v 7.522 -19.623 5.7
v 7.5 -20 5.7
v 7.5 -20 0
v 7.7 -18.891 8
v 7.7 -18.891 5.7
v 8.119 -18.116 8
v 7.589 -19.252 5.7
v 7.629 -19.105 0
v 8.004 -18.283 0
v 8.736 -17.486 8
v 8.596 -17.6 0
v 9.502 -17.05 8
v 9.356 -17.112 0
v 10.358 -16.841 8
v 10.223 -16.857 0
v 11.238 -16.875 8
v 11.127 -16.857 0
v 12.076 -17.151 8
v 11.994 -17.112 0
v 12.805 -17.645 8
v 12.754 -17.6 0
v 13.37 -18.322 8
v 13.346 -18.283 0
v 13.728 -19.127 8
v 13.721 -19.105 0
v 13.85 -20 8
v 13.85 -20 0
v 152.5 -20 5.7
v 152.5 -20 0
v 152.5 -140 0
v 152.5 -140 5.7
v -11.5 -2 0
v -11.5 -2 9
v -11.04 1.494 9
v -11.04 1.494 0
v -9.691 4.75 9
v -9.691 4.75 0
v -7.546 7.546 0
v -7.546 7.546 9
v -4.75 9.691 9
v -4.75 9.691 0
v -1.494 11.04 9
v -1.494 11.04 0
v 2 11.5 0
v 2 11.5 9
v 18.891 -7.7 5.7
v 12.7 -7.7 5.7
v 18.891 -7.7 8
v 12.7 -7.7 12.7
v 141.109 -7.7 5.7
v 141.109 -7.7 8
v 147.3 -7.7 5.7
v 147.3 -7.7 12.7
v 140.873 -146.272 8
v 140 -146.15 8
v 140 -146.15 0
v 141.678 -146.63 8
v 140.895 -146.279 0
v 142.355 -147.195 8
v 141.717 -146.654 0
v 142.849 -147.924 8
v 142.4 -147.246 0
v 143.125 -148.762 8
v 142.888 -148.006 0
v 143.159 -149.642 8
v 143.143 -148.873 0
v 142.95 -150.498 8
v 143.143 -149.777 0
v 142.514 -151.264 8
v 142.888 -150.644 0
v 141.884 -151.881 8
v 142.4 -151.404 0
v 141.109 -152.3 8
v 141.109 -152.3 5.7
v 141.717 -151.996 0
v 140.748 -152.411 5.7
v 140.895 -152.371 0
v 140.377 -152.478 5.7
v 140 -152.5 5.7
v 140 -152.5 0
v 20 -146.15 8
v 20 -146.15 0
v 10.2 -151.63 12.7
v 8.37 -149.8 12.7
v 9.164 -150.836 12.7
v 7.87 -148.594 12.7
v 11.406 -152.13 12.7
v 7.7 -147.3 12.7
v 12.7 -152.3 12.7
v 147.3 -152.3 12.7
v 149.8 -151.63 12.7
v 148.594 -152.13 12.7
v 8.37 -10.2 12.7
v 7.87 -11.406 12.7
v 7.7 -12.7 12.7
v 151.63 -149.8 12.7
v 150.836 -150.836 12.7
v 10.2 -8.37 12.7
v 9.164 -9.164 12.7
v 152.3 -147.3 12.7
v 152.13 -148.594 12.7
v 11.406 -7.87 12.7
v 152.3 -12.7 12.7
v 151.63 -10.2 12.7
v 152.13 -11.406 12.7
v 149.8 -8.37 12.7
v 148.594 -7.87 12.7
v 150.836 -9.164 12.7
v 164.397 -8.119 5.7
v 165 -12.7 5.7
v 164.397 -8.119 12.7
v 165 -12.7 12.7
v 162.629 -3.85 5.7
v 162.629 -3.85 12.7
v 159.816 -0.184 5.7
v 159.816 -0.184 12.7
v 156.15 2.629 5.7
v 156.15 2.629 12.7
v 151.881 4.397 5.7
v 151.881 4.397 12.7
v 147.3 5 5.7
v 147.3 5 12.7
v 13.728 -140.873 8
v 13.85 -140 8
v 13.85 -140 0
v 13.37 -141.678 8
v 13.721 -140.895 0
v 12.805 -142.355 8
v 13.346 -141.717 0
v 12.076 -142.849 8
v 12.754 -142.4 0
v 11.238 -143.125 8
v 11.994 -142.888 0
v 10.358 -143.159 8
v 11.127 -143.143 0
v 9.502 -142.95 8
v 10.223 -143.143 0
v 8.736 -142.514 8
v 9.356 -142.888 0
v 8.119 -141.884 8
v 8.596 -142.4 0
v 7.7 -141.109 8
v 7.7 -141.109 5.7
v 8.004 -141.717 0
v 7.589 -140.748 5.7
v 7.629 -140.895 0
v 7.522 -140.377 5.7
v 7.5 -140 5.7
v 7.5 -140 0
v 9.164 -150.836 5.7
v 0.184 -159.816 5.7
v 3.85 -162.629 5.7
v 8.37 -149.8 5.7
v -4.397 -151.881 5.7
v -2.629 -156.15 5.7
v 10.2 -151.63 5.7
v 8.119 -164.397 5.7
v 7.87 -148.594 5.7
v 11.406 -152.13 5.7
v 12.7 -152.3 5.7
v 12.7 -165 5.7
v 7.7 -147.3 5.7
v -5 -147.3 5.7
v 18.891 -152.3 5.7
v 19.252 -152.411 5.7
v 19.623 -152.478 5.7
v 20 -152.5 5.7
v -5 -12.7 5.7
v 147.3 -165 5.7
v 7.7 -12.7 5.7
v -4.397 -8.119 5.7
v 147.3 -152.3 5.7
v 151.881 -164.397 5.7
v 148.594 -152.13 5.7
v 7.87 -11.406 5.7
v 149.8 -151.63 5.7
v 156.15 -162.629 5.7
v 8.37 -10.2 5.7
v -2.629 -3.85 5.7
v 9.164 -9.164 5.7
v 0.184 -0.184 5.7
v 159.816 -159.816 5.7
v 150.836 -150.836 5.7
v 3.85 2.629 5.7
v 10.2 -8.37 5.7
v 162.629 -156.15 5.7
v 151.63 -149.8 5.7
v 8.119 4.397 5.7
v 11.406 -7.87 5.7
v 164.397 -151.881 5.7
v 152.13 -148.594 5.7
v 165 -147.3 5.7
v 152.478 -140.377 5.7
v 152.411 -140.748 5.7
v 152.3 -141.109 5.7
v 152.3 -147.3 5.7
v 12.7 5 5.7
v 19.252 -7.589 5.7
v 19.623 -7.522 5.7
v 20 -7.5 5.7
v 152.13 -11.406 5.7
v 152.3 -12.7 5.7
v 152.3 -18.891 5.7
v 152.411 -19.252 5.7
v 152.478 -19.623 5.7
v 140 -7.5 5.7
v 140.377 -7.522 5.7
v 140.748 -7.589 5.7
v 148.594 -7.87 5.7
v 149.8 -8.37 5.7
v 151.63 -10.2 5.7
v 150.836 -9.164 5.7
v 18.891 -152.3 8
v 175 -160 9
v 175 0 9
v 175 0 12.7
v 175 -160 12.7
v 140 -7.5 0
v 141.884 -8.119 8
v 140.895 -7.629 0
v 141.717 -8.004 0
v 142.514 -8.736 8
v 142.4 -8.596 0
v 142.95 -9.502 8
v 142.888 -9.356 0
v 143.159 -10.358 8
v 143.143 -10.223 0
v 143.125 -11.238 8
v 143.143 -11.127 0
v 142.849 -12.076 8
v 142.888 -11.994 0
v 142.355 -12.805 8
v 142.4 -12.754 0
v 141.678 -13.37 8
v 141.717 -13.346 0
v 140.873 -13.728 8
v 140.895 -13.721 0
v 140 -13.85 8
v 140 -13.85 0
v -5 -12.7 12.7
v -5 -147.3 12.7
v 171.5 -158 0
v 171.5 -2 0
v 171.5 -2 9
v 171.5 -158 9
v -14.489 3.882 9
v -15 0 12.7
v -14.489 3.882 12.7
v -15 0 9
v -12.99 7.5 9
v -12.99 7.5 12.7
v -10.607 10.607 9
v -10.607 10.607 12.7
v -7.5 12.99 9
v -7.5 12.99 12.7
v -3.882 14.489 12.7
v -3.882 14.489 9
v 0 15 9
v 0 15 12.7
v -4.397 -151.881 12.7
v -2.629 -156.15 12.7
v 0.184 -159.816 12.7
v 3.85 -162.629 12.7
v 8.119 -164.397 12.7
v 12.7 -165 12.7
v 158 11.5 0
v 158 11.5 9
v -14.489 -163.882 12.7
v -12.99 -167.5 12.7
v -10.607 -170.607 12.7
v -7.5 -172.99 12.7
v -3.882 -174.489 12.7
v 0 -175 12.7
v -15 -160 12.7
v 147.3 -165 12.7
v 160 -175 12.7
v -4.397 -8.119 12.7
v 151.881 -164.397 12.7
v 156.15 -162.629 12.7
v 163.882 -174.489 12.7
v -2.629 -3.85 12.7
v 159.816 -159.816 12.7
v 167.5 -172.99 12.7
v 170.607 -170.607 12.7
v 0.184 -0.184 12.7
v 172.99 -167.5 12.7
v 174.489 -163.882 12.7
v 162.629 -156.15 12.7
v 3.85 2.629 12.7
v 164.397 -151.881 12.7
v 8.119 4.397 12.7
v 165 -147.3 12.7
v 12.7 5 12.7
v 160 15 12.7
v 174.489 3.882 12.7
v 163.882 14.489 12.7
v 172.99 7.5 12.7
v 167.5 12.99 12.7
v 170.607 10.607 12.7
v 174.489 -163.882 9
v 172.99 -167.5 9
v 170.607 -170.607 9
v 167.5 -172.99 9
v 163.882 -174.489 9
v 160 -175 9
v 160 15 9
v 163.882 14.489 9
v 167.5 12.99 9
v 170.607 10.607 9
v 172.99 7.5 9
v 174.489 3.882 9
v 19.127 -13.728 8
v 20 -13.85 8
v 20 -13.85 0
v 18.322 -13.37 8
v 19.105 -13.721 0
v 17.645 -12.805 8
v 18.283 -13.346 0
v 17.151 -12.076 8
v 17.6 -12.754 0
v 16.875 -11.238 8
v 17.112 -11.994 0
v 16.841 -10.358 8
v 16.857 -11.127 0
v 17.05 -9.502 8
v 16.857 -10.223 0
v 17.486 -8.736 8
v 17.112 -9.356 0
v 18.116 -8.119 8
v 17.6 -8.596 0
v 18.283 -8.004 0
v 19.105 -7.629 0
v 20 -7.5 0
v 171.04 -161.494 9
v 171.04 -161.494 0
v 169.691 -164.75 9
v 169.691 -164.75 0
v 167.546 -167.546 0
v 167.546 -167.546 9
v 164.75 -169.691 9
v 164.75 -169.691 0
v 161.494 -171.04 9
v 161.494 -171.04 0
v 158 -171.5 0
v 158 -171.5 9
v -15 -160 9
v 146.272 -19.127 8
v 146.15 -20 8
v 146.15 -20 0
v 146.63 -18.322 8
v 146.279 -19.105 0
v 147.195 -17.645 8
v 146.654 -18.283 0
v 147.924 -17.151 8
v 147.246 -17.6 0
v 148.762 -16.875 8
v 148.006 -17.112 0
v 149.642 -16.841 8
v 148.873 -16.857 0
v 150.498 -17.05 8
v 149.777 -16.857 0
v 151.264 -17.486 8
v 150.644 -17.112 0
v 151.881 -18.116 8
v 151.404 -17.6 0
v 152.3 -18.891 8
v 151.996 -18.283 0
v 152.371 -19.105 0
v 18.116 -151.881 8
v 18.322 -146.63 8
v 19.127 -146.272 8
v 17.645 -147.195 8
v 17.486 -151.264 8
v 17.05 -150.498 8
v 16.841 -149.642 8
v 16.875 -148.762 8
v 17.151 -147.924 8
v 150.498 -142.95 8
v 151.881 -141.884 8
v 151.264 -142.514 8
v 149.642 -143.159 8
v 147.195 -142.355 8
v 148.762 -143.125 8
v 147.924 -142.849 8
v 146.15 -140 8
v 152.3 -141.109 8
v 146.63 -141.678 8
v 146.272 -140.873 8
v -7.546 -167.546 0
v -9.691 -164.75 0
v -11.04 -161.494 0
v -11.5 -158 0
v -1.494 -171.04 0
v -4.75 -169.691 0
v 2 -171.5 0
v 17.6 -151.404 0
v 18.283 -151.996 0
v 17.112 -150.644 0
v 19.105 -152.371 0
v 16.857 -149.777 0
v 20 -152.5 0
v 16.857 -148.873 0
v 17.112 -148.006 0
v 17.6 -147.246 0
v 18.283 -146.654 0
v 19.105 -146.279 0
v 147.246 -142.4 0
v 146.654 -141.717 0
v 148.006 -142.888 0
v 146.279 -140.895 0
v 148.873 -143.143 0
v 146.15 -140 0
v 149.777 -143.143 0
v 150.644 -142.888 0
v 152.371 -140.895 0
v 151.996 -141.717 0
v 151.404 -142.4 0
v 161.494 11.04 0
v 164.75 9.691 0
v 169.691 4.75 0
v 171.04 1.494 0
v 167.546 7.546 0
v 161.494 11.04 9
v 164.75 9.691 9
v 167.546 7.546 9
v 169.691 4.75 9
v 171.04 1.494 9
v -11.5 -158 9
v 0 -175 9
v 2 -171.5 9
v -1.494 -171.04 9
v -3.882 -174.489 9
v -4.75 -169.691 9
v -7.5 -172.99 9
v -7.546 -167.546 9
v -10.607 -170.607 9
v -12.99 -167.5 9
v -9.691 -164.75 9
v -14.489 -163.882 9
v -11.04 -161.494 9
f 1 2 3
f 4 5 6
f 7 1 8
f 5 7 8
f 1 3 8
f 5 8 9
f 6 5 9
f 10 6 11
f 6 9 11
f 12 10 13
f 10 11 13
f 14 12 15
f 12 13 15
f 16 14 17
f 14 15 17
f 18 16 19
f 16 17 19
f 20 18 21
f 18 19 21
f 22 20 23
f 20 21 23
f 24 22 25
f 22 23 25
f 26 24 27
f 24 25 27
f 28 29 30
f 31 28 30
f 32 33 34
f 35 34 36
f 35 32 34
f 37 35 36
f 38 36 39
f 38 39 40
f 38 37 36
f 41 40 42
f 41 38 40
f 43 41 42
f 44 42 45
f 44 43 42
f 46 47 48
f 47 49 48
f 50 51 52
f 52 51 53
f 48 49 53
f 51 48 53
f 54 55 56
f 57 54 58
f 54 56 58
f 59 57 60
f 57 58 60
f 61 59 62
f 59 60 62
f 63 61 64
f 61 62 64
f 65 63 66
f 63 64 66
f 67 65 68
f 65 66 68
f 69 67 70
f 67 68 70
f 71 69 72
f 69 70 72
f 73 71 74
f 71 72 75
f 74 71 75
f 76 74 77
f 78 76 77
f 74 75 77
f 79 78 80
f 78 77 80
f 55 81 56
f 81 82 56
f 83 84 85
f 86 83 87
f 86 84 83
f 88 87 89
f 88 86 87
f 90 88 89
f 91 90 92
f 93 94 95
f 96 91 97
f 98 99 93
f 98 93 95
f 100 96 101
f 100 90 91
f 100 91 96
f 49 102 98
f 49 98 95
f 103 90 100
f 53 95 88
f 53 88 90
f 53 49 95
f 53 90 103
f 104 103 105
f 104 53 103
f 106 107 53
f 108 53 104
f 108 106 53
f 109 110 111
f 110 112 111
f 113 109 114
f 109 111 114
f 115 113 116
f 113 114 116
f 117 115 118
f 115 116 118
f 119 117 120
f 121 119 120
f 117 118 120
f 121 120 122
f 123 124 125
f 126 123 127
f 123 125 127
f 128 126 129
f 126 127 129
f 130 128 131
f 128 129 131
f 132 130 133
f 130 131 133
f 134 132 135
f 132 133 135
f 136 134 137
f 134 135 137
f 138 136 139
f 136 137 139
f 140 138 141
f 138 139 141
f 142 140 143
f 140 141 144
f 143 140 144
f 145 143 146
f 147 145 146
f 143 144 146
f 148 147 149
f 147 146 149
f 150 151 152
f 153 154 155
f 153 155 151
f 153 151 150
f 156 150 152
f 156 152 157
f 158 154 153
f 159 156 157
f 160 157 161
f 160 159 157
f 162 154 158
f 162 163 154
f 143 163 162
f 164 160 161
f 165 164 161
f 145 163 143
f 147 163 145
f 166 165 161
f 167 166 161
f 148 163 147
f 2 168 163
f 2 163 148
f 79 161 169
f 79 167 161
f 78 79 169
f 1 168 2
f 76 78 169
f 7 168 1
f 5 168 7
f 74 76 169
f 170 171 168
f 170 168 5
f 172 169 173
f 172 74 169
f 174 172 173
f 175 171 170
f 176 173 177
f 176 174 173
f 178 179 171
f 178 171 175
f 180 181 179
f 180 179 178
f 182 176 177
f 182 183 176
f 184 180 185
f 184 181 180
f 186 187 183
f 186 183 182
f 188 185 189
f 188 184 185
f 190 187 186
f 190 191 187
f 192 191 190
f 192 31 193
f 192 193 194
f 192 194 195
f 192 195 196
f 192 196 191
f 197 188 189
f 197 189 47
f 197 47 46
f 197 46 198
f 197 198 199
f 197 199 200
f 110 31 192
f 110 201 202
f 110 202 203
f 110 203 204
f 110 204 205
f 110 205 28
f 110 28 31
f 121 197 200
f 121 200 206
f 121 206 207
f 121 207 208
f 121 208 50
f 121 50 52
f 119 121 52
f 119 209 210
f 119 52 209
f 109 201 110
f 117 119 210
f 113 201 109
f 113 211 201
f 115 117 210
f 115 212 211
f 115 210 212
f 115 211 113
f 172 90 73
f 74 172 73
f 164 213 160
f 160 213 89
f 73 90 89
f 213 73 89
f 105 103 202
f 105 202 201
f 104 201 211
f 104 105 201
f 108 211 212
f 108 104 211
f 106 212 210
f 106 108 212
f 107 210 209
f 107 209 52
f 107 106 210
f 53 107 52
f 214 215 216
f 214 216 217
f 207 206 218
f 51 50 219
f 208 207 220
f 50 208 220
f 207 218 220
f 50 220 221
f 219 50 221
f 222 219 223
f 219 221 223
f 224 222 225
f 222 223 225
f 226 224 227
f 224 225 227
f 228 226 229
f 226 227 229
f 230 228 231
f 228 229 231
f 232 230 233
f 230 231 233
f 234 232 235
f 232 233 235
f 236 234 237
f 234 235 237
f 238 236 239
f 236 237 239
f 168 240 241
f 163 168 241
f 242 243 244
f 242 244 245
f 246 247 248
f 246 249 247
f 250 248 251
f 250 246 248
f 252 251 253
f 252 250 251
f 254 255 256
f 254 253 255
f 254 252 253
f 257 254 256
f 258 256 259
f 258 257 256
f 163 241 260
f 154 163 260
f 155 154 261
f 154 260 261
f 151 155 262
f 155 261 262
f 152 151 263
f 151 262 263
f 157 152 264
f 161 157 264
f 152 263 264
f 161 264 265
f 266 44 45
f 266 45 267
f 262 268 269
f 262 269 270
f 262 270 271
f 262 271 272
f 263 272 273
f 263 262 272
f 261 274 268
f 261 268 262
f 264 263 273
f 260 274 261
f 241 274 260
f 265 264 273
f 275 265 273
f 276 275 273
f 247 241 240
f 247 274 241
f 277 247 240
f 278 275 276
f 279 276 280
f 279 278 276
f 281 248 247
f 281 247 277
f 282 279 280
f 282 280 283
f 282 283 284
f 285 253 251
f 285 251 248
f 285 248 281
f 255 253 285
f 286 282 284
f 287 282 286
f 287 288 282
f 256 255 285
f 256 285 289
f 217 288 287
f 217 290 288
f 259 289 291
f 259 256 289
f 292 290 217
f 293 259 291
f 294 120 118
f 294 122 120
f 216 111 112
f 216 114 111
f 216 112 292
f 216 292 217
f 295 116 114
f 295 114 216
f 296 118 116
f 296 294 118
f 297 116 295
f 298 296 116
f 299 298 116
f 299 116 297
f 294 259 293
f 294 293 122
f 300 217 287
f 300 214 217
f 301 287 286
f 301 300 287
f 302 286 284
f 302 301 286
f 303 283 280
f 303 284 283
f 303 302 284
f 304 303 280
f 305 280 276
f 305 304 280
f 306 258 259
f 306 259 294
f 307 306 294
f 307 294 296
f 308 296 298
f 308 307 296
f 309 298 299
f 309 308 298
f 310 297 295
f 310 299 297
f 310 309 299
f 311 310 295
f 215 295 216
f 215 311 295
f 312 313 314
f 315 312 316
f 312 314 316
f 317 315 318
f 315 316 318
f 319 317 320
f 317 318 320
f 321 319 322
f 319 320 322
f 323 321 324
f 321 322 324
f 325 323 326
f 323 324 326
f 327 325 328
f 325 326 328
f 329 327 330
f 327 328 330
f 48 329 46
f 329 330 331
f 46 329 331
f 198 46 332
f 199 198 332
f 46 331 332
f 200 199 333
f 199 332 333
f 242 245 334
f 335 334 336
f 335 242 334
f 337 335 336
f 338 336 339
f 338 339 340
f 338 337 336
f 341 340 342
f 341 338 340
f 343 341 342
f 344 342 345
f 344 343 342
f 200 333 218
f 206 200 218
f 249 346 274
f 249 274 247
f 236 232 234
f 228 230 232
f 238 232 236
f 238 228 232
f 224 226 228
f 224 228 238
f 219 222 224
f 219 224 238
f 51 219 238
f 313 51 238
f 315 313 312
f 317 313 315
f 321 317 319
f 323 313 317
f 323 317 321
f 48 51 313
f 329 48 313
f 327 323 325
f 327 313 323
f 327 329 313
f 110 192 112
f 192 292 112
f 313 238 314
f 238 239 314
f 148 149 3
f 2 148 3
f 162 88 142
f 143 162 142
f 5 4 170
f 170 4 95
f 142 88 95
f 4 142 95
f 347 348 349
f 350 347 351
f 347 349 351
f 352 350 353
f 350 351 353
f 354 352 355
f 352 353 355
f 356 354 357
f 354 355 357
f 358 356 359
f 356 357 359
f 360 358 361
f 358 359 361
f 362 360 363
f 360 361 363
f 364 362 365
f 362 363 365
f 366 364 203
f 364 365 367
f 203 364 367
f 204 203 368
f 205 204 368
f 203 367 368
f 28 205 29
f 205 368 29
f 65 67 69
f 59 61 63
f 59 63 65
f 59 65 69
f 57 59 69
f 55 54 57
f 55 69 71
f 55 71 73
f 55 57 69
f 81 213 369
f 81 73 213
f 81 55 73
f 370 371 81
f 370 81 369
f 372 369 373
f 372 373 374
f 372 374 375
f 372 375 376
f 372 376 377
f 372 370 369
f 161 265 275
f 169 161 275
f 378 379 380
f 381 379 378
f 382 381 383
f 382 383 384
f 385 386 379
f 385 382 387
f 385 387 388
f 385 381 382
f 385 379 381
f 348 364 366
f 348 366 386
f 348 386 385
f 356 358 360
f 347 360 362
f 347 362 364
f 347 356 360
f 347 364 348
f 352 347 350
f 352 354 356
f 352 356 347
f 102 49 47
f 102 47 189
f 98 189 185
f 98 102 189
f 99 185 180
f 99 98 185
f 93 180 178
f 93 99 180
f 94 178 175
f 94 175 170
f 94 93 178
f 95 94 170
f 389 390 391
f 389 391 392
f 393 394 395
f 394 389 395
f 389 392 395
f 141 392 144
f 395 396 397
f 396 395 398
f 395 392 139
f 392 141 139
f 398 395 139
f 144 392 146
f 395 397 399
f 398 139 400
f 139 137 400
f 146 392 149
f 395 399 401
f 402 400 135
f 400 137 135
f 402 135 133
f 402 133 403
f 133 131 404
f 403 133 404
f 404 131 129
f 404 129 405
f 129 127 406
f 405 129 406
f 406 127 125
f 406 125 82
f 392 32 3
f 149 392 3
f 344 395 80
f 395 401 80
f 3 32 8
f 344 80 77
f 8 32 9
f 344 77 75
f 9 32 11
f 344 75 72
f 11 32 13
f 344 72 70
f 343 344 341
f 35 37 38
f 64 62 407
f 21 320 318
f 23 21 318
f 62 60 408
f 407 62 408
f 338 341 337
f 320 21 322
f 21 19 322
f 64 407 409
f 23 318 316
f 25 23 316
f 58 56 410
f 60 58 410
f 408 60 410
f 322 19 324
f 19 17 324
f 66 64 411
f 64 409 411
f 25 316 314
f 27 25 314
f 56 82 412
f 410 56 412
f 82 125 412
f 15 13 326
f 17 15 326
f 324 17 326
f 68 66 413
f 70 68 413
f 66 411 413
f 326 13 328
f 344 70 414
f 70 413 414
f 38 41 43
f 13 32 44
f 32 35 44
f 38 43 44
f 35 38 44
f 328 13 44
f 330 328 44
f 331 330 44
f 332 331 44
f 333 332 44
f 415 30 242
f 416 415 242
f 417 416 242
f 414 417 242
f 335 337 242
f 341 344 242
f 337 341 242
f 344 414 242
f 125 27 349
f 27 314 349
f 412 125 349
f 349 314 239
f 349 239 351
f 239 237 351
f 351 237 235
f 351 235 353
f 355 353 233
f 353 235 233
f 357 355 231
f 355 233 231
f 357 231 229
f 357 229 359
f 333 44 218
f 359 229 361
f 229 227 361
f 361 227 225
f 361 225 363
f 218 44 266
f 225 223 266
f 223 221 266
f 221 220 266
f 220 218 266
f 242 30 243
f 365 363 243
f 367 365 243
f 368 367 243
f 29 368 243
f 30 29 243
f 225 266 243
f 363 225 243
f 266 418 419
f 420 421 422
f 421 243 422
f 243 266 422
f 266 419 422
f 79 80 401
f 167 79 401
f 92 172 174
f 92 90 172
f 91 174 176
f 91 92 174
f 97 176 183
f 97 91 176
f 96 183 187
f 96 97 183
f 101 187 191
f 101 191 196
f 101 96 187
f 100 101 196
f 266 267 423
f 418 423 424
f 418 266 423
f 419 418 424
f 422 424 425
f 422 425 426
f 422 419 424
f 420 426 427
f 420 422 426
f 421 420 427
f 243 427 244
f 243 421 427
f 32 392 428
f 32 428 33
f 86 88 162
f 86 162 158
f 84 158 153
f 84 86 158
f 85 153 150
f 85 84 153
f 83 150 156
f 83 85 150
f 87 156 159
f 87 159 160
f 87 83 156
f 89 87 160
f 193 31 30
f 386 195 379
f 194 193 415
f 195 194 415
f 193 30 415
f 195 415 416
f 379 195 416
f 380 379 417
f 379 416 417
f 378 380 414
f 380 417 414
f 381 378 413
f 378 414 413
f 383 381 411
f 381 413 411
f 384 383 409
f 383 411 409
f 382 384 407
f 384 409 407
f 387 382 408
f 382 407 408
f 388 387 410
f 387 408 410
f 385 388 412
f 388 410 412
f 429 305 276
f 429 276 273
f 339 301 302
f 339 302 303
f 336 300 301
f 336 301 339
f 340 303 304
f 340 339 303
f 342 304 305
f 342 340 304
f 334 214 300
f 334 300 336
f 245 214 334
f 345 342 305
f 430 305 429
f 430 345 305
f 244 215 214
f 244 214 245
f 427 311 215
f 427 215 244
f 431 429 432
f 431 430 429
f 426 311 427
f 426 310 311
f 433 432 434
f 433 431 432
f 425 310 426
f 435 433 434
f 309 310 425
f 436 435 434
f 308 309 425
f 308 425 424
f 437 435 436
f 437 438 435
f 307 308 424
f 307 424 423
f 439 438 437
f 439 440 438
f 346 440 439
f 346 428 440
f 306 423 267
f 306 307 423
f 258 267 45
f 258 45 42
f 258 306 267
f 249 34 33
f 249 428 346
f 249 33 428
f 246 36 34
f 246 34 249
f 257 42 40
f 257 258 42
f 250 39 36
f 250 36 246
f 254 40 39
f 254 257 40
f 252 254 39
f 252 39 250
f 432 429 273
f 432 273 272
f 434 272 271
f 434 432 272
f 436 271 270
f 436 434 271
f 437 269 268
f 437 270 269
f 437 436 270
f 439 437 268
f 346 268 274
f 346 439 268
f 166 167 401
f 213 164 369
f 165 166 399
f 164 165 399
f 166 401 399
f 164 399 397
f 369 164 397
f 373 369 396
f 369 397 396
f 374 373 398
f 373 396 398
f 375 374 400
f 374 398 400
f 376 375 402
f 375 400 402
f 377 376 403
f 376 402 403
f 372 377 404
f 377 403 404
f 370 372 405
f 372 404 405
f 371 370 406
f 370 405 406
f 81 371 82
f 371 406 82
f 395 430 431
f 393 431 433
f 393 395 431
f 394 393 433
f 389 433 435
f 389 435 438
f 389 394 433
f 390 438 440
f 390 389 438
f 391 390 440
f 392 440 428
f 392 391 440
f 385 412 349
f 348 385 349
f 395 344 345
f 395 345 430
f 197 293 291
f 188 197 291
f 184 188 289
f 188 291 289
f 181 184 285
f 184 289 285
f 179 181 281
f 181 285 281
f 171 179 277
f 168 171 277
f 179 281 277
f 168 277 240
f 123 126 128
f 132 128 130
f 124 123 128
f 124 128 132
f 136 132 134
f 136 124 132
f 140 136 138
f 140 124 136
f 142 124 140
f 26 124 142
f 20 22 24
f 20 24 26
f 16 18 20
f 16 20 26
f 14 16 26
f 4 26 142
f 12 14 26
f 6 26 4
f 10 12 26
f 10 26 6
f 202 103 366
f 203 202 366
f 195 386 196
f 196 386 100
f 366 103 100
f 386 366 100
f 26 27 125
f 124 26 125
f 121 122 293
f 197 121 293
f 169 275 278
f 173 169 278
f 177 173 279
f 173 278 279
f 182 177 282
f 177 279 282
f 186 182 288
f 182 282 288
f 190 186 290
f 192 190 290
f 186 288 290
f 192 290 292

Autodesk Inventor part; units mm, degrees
ref_plane "YZ Plane" through (0, 0, 0) normal (1, 0, 0) x (0, 1, 0)
ref_plane "XZ Plane" through (0, 0, 0) normal (0, 1, 0) x (-1, 0, 0)
ref_plane "XY Plane" through (0, 0, 0) normal (0, 0, 1) x (1, 0, 0)
sketch "Sketch1" plane through (0, 0, 0) normal (0, 0, 1) x (1, 0, 0)
  arc A0 (-15, -160) -> (0, -175) centre (0, -160) ccw
  line L0 (0, 15) -> (160, 15)
  line L1 (175, 0) -> (175, -160)
  line L2 (160, -175) -> (0, -175)
  line L3 (-15, -160) -> (-15, 0)
  arc A1 (0, 15) -> (-15, 0) centre (0, 0) ccw
  arc A2 (160, -175) -> (175, -160) centre (160, -160) ccw
  arc A3 (175, 0) -> (160, 15) centre (160, 0) ccw
  point P0 (-15, 15)
  dimension "d0" = 190
  dimension "d1" = 190
  dimension "d2" = 15
extrude "Extrusion1" add sketch "Sketch1" along normal blind 12.7
sketch "Sketch2" plane through (0, 0, 12.7) normal (0, 0, 1) x (1, 0, 0)
  line L0 (-15, 0) -> (-15, -160) projected
  arc A0 (-15, -160) -> (0, -175) centre (0, -160) ccw projected
  line L1 (0, -175) -> (160, -175) projected
  arc A1 (160, -175) -> (175, -160) centre (160, -160) ccw projected
  line L2 (175, -160) -> (175, 0) projected
  arc A2 (175, 0) -> (160, 15) centre (160, 0) ccw projected
  line L3 (160, 15) -> (0, 15) projected
  arc A3 (0, 15) -> (-15, 0) centre (0, 0) ccw projected
  line L4 (0, 0) -> (160, -160) construction
  line L5 (147.3, -152.3) -> (12.7, -152.3)
  line L6 (7.7, -147.3) -> (7.7, -12.7)
  line L7 (12.7, -7.7) -> (147.3, -7.7)
  line L8 (152.3, -12.7) -> (152.3, -147.3)
  line L9 (152.3, -152.3) -> (7.7, -7.7) construction
  line L10 (7.7, -152.3) -> (152.3, -7.7) construction
  arc A4 (12.7, -7.7) -> (7.7, -12.7) centre (12.7, -12.7) ccw
  arc A5 (152.3, -12.7) -> (147.3, -7.7) centre (147.3, -12.7) ccw
  arc A6 (147.3, -152.3) -> (152.3, -147.3) centre (147.3, -147.3) ccw
  arc A7 (7.7, -147.3) -> (12.7, -152.3) centre (12.7, -147.3) ccw
  line L11 (147.3, 5) -> (12.7, 5)
  arc A8 (12.7, 5) -> (-5, -12.7) centre (12.7, -12.7) ccw
  line L12 (-5, -12.7) -> (-5, -147.3)
  arc A9 (-5, -147.3) -> (12.7, -165) centre (12.7, -147.3) ccw
  line L13 (12.7, -165) -> (147.3, -165)
  arc A10 (147.3, -165) -> (165, -147.3) centre (147.3, -147.3) ccw
  line L14 (165, -147.3) -> (165, -12.7)
  arc A11 (165, -12.7) -> (147.3, 5) centre (147.3, -12.7) ccw
  point P0 (80, -80)
  dimension "d7" = 5
  dimension "d8" = 12.7
  dimension "d9" = 10
extrude "Extrusion2" cut sketch "Sketch2" against normal blind 7 contours A11 L14 A10 L13 A9 L12 A8 L11
sketch "Sketch3" plane through (0, 0, 0) normal (0, 0, -1) x (-1, 0, 0)
  line L0 (-140, -10.675) -> (-20, -10.675) construction
  line L1 (-147.3, -7.7) -> (-12.7, -7.7) projected
  line L2 (-140, -13.85) -> (-20, -13.85)
  line L3 (-20, -7.5) -> (-140, -7.5)
  arc A0 (-140, -7.5) -> (-140, -13.85) centre (-140, -10.675) ccw
  arc A1 (-20, -13.85) -> (-20, -7.5) centre (-20, -10.675) ccw
  line L4 (15, -160) -> (15, 0) projected
  line L5 (-175, 0) -> (-175, -160) projected
  arc A2 (-160, 15) -> (-175, 0) centre (-160, 0) ccw projected
  arc A3 (0, -175) -> (15, -160) centre (0, -160) ccw projected
  line L6 (-160, 0) -> (0, -160) construction
  circle A4 centre (-80, -80) radius 16.0572 construction
  arc A5 (-152.5, -140) -> (-146.15, -140) centre (-149.325, -140) ccw
  line L7 (-152.5, -20) -> (-152.5, -140)
  line L8 (-146.15, -140) -> (-146.15, -20)
  arc A6 (-146.15, -20) -> (-152.5, -20) centre (-149.325, -20) ccw
  line L9 (-149.325, -140) -> (-149.325, -20) construction
  arc A7 (-20, -152.5) -> (-20, -146.15) centre (-20, -149.325) ccw
  line L10 (-140, -152.5) -> (-20, -152.5)
  line L11 (-20, -146.15) -> (-140, -146.15)
  arc A8 (-140, -146.15) -> (-140, -152.5) centre (-140, -149.325) ccw
  line L12 (-20, -149.325) -> (-140, -149.325) construction
  arc A9 (-7.5, -20) -> (-13.85, -20) centre (-10.675, -20) ccw
  line L13 (-7.5, -140) -> (-7.5, -20)
  line L14 (-13.85, -20) -> (-13.85, -140)
  arc A10 (-13.85, -140) -> (-7.5, -140) centre (-10.675, -140) ccw
  line L15 (-10.675, -20) -> (-10.675, -140) construction
  point P0 (0, 0)
  point P1 (-80, -10.675)
  point P2 (-149.325, -80)
  point P3 (-80, -149.325)
  point P4 (-10.675, -80)
  dimension "d12" = 6.35
  dimension "d13" = 0.2
  dimension "d14" = 35
  dimension "d15" = 35
  dimension "d18" = 360
extrude "Extrusion3" cut sketch "Sketch3" against normal blind 8
sketch "Sketch4" plane through (0, 0, 0) normal (0, 0, -1) x (-1, 0, 0)
  arc A0 (0, -175) -> (15, -160) centre (0, -160) ccw projected
  arc A1 (-160, 15) -> (-175, 0) centre (-160, 0) ccw projected
  line L0 (0, -160) -> (-160, 0) construction
  line L1 (-2, 11.5) -> (-158, 11.5)
  line L2 (-171.5, -2) -> (-171.5, -158)
  line L3 (-158, -171.5) -> (-2, -171.5)
  line L4 (11.5, -158) -> (11.5, -2)
  line L5 (11.5, 11.5) -> (-171.5, -171.5) construction
  line L6 (-171.5, 11.5) -> (11.5, -171.5) construction
  arc A2 (-2, -171.5) -> (11.5, -158) centre (-2, -158) ccw
  arc A3 (-171.5, -158) -> (-158, -171.5) centre (-158, -158) ccw
  arc A4 (-158, 11.5) -> (-171.5, -2) centre (-158, -2) ccw
  arc A5 (11.5, -2) -> (-2, 11.5) centre (-2, -2) ccw
  arc A6 (-20, -152.5) -> (-20, -146.15) centre (-20, -149.325) ccw projected
  line L7 (-20, -152.5) -> (-140, -152.5) projected
  arc A7 (-140, -146.15) -> (-140, -152.5) centre (-140, -149.325) ccw projected
  line L8 (-140, -146.15) -> (-20, -146.15) projected
  arc A8 (-20, -13.85) -> (-20, -7.5) centre (-20, -10.675) ccw projected
  line L9 (-20, -13.85) -> (-140, -13.85) projected
  arc A9 (-140, -7.5) -> (-140, -13.85) centre (-140, -10.675) ccw projected
  line L10 (-140, -7.5) -> (-20, -7.5) projected
  arc A10 (-152.5, -140) -> (-146.15, -140) centre (-149.325, -140) ccw projected
  line L11 (-152.5, -140) -> (-152.5, -20) projected
  arc A11 (-146.15, -20) -> (-152.5, -20) centre (-149.325, -20) ccw projected
  line L12 (-146.15, -20) -> (-146.15, -140) projected
  arc A12 (-7.5, -20) -> (-13.85, -20) centre (-10.675, -20) ccw projected
  line L13 (-7.5, -20) -> (-7.5, -140) projected
  arc A13 (-13.85, -140) -> (-7.5, -140) centre (-10.675, -140) ccw projected
  line L14 (-13.85, -140) -> (-13.85, -20) projected
  line L15 (15, -160) -> (15, 0) projected
  arc A14 (15, 0) -> (0, 15) centre (0, 0) ccw projected
  line L16 (0, 15) -> (-160, 15) projected
  arc A15 (-160, 15) -> (-175, 0) centre (-160, 0) ccw projected
  line L17 (-175, 0) -> (-175, -160) projected
  arc A16 (-175, -160) -> (-160, -175) centre (-160, -160) ccw projected
  line L18 (-160, -175) -> (0, -175) projected
  arc A17 (0, -175) -> (15, -160) centre (0, -160) ccw projected
  point P0 (-80, -80)
  dimension "d22" = 183
  dimension "d23" = 183
  dimension "d24" = 13.5
extrude "Extrusion4" cut sketch "Sketch4" against normal blind 9 contours L18 A16 L17 A1 L16 A14 L15 A0
equation "\"d14\" = d15"
properties part number "NewLid"
